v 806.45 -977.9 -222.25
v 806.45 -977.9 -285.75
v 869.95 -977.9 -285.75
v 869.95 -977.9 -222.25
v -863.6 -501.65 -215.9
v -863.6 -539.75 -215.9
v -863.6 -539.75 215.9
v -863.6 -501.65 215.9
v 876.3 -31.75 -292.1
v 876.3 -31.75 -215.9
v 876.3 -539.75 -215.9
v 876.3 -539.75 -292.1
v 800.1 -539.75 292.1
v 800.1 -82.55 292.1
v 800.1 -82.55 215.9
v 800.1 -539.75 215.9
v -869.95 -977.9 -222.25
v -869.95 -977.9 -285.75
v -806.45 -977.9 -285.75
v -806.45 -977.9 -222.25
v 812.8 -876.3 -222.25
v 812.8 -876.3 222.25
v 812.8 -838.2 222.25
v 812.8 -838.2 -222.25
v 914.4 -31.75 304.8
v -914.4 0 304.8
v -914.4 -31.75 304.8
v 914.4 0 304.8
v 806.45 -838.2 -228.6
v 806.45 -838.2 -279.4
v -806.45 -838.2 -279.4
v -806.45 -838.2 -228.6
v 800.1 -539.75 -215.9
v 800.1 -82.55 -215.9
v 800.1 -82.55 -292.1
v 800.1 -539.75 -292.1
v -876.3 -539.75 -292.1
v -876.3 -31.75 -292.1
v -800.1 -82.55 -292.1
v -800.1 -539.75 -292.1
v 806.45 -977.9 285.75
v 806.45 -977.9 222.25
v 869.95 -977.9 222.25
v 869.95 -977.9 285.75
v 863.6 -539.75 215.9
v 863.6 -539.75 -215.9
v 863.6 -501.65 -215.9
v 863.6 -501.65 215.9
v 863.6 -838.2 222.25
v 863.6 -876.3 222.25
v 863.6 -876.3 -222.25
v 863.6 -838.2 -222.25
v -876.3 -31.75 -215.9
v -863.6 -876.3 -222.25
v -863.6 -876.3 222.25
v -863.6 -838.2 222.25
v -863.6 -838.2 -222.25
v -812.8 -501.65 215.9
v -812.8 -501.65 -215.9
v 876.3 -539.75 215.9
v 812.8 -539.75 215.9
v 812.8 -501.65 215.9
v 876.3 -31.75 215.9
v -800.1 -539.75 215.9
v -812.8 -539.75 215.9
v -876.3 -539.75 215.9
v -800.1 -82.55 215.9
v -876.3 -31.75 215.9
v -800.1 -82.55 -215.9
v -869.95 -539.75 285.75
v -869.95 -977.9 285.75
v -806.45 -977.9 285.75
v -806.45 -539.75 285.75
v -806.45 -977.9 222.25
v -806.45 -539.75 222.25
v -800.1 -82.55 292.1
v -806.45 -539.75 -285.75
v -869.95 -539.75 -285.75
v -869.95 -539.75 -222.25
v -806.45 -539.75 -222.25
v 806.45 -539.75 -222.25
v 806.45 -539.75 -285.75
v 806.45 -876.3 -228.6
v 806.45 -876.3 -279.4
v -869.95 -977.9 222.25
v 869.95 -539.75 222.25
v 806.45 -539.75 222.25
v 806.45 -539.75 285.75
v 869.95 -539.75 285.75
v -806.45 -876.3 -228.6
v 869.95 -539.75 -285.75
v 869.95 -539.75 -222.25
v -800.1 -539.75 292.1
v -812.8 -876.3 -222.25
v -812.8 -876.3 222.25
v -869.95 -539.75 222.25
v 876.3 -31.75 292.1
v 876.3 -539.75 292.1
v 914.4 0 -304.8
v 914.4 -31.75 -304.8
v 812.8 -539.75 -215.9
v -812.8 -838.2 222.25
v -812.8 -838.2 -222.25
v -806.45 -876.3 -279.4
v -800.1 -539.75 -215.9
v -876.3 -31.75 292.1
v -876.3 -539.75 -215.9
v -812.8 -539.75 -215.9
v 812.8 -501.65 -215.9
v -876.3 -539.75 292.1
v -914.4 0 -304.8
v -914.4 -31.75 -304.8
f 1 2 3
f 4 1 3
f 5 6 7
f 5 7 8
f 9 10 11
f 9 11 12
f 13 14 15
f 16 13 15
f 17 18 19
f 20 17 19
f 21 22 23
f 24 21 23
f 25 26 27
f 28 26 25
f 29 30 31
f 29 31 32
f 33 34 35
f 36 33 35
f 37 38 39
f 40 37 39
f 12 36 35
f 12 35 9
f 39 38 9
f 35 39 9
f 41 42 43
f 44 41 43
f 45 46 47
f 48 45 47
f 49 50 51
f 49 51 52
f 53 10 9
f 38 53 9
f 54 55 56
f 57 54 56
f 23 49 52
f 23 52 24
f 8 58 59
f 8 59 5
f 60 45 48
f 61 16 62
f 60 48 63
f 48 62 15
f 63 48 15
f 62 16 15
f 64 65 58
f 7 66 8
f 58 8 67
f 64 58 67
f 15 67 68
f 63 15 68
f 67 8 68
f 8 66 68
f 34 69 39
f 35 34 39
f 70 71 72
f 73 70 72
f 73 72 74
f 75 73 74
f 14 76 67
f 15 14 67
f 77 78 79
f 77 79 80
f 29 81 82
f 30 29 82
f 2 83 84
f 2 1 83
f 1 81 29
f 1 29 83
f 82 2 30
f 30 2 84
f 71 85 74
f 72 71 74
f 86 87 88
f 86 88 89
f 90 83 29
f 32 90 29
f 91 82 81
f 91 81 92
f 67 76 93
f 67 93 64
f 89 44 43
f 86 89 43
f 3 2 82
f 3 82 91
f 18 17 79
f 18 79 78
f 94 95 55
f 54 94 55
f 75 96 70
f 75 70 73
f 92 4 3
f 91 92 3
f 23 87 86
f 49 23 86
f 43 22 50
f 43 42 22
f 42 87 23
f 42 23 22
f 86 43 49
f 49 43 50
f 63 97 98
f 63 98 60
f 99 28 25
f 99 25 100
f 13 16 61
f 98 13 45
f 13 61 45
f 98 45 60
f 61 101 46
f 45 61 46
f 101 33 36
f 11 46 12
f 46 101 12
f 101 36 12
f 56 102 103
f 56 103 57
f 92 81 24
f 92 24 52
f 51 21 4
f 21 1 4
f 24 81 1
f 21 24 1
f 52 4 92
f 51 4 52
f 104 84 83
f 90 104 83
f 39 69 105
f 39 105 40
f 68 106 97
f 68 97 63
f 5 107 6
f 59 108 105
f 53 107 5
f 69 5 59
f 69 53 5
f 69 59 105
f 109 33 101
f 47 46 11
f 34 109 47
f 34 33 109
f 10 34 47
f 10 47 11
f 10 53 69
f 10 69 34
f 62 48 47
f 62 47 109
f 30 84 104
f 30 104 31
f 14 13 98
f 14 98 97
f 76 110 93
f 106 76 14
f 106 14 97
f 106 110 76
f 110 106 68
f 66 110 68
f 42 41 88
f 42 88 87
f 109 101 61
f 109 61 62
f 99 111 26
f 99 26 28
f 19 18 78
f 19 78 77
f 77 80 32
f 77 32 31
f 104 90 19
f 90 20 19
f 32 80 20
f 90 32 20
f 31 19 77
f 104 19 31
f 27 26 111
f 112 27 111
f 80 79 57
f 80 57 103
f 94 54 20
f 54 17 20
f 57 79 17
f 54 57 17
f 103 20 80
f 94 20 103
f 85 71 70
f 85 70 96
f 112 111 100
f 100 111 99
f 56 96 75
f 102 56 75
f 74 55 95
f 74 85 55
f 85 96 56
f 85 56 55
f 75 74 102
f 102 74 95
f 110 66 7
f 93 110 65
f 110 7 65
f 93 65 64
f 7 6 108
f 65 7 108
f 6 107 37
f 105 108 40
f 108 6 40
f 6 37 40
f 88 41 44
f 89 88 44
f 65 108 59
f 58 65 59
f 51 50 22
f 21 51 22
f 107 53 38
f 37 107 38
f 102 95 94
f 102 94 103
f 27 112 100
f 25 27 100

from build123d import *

# Parameters (mm, degrees)
SKETCH1_W                  = 1828.8
SKETCH1_H                  = 609.6
BOSS_EXTRUDE1_DEPTH        = 31.75
BOSS_EXTRUDE2_DEPTH        = 876.3
BOSS_EXTRUDE2_DEPTH_BACK   = 876.3
SKETCH2_W                  = 76.2
SKETCH2_H                  = 50.8
BOSS_EXTRUDE2_2_DEPTH      = 876.3
BOSS_EXTRUDE2_2_DEPTH_BACK = 876.3
SKETCH3_W                  = 76.2
SKETCH3_H                  = 76.2
BOSS_EXTRUDE3_DEPTH        = 508
SKETCH4_W                  = 50.8
SKETCH4_H                  = 38.1
BOSS_EXTRUDE4_DEPTH        = 431.8
SKETCH6_W                  = 63.5
SKETCH6_H                  = 63.5
BOSS_EXTRUDE5_DEPTH        = 438.15
BOSS_EXTRUDE5_2_DEPTH      = 438.15
BOSS_EXTRUDE5_3_DEPTH      = 438.15
BOSS_EXTRUDE5_4_DEPTH      = 438.15
SKETCH7_W                  = 50.8
SKETCH7_H                  = 38.1
BOSS_EXTRUDE6_DEPTH        = 444.5
SKETCH8_W                  = 50.8
SKETCH8_H                  = 38.1
BOSS_EXTRUDE7_DEPTH        = 1612.9


with BuildPart() as part:
    # Sketch1 → Boss-Extrude1 (new body)
    with BuildSketch(Plane(origin=(0, 0, 0), x_dir=(1, 0, 0), z_dir=(0, 1, 0))):
        Rectangle(SKETCH1_W, SKETCH1_H)
    extrude(amount=-BOSS_EXTRUDE1_DEPTH)


with BuildPart() as body_2:
    # Sketch2 → Boss-Extrude2 (new, two sides: drawn at the far end of the back side and taken through both)
    with BuildSketch(Plane(origin=(0, 0, 0), x_dir=(0, 0, -1), z_dir=(1, 0, 0)).offset(-BOSS_EXTRUDE2_DEPTH_BACK)):
        with Locations((-254, -57.15)):
            Rectangle(SKETCH2_W, SKETCH2_H)
    extrude(amount=BOSS_EXTRUDE2_DEPTH + BOSS_EXTRUDE2_DEPTH_BACK)



with BuildPart() as body_3:
    # Sketch2 → Boss-Extrude2 2 (new, two sides: drawn at the far end of the back side and taken through both)
    with BuildSketch(Plane(origin=(0, 0, 0), x_dir=(0, 0, -1), z_dir=(1, 0, 0)).offset(-BOSS_EXTRUDE2_2_DEPTH_BACK)):
        with Locations((254, -57.15)):
            Rectangle(SKETCH2_W, SKETCH2_H)
    extrude(amount=BOSS_EXTRUDE2_2_DEPTH + BOSS_EXTRUDE2_2_DEPTH_BACK)


with BuildPart() as body_2_1:
    add(body_2.part)

    add(body_3.part)  # Boss-Extrude3 merges body 3
    # Sketch3 → Boss-Extrude3 (add)
    with BuildSketch(Plane(origin=(0, -31.75, 0), x_dir=(1, 0, 0), z_dir=(0, 1, 0))):
        with Locations((838.2, -254)):
            Rectangle(SKETCH3_W, SKETCH3_H)
        with Locations((-838.2, -254)):
            Rectangle(SKETCH3_W, SKETCH3_H)
        with Locations((-838.2, 254)):
            Rectangle(SKETCH3_W, SKETCH3_H)
        with Locations((838.2, 254)):
            Rectangle(SKETCH3_W, SKETCH3_H)
    extrude(amount=-BOSS_EXTRUDE3_DEPTH)

    # Sketch4 → Boss-Extrude4 (add)
    with BuildSketch(Plane(origin=(0, 0, 215.9), x_dir=(-1, 0, 0), z_dir=(0, 0, -1))):
        with Locations((-838.2, -520.7)):
            Rectangle(SKETCH4_W, SKETCH4_H)
        with Locations((838.2, -520.7)):
            Rectangle(SKETCH4_W, SKETCH4_H)
    extrude(amount=BOSS_EXTRUDE4_DEPTH)


with BuildPart() as body_3_2:
    # Sketch6 → Boss-Extrude5 (new body)
    with BuildSketch(Plane(origin=(0, -977.9, 0), x_dir=(1, 0, 0), z_dir=(0, 1, 0))):
        with Locations((-838.2, 254)):
            Rectangle(SKETCH6_W, SKETCH6_H)
    extrude(amount=BOSS_EXTRUDE5_DEPTH)



with BuildPart() as body_4:
    # Sketch6 → Boss-Extrude5 2 (new body)
    with BuildSketch(Plane(origin=(0, -977.9, 0), x_dir=(1, 0, 0), z_dir=(0, 1, 0))):
        with Locations((-838.2, -254)):
            Rectangle(SKETCH6_W, SKETCH6_H)
    extrude(amount=BOSS_EXTRUDE5_2_DEPTH)


with BuildPart() as body_5:
    # Sketch6 → Boss-Extrude5 3 (new body)
    with BuildSketch(Plane(origin=(0, -977.9, 0), x_dir=(1, 0, 0), z_dir=(0, 1, 0))):
        with Locations((838.2, -254)):
            Rectangle(SKETCH6_W, SKETCH6_H)
    extrude(amount=BOSS_EXTRUDE5_3_DEPTH)


with BuildPart() as body_6:
    # Sketch6 → Boss-Extrude5 4 (new body)
    with BuildSketch(Plane(origin=(0, -977.9, 0), x_dir=(1, 0, 0), z_dir=(0, 1, 0))):
        with Locations((838.2, 254)):
            Rectangle(SKETCH6_W, SKETCH6_H)
    extrude(amount=BOSS_EXTRUDE5_4_DEPTH)


with BuildPart() as body_3_2_1:
    add(body_3_2.part)

    add(body_4.part)  # Boss-Extrude6 merges body 4

    add(body_5.part)  # Boss-Extrude6 merges body 5

    add(body_6.part)  # Boss-Extrude6 merges body 6
    # Sketch7 → Boss-Extrude6 (add)
    with BuildSketch(Plane(origin=(0, 0, 222.25), x_dir=(-1, 0, 0), z_dir=(0, 0, -1))):
        with Locations((-838.2, -857.25)):
            Rectangle(SKETCH7_W, SKETCH7_H)
        with Locations((838.2, -857.25)):
            Rectangle(SKETCH7_W, SKETCH7_H)
    extrude(amount=BOSS_EXTRUDE6_DEPTH)

    # Sketch8 → Boss-Extrude7 (add)
    with BuildSketch(Plane.ZY.offset(-806.45)):
        with Locations((-254, -857.25)):
            Rectangle(SKETCH8_W, SKETCH8_H)
    extrude(amount=BOSS_EXTRUDE7_DEPTH)


solid = Compound([part.part, body_2_1.part, body_3_2_1.part])
